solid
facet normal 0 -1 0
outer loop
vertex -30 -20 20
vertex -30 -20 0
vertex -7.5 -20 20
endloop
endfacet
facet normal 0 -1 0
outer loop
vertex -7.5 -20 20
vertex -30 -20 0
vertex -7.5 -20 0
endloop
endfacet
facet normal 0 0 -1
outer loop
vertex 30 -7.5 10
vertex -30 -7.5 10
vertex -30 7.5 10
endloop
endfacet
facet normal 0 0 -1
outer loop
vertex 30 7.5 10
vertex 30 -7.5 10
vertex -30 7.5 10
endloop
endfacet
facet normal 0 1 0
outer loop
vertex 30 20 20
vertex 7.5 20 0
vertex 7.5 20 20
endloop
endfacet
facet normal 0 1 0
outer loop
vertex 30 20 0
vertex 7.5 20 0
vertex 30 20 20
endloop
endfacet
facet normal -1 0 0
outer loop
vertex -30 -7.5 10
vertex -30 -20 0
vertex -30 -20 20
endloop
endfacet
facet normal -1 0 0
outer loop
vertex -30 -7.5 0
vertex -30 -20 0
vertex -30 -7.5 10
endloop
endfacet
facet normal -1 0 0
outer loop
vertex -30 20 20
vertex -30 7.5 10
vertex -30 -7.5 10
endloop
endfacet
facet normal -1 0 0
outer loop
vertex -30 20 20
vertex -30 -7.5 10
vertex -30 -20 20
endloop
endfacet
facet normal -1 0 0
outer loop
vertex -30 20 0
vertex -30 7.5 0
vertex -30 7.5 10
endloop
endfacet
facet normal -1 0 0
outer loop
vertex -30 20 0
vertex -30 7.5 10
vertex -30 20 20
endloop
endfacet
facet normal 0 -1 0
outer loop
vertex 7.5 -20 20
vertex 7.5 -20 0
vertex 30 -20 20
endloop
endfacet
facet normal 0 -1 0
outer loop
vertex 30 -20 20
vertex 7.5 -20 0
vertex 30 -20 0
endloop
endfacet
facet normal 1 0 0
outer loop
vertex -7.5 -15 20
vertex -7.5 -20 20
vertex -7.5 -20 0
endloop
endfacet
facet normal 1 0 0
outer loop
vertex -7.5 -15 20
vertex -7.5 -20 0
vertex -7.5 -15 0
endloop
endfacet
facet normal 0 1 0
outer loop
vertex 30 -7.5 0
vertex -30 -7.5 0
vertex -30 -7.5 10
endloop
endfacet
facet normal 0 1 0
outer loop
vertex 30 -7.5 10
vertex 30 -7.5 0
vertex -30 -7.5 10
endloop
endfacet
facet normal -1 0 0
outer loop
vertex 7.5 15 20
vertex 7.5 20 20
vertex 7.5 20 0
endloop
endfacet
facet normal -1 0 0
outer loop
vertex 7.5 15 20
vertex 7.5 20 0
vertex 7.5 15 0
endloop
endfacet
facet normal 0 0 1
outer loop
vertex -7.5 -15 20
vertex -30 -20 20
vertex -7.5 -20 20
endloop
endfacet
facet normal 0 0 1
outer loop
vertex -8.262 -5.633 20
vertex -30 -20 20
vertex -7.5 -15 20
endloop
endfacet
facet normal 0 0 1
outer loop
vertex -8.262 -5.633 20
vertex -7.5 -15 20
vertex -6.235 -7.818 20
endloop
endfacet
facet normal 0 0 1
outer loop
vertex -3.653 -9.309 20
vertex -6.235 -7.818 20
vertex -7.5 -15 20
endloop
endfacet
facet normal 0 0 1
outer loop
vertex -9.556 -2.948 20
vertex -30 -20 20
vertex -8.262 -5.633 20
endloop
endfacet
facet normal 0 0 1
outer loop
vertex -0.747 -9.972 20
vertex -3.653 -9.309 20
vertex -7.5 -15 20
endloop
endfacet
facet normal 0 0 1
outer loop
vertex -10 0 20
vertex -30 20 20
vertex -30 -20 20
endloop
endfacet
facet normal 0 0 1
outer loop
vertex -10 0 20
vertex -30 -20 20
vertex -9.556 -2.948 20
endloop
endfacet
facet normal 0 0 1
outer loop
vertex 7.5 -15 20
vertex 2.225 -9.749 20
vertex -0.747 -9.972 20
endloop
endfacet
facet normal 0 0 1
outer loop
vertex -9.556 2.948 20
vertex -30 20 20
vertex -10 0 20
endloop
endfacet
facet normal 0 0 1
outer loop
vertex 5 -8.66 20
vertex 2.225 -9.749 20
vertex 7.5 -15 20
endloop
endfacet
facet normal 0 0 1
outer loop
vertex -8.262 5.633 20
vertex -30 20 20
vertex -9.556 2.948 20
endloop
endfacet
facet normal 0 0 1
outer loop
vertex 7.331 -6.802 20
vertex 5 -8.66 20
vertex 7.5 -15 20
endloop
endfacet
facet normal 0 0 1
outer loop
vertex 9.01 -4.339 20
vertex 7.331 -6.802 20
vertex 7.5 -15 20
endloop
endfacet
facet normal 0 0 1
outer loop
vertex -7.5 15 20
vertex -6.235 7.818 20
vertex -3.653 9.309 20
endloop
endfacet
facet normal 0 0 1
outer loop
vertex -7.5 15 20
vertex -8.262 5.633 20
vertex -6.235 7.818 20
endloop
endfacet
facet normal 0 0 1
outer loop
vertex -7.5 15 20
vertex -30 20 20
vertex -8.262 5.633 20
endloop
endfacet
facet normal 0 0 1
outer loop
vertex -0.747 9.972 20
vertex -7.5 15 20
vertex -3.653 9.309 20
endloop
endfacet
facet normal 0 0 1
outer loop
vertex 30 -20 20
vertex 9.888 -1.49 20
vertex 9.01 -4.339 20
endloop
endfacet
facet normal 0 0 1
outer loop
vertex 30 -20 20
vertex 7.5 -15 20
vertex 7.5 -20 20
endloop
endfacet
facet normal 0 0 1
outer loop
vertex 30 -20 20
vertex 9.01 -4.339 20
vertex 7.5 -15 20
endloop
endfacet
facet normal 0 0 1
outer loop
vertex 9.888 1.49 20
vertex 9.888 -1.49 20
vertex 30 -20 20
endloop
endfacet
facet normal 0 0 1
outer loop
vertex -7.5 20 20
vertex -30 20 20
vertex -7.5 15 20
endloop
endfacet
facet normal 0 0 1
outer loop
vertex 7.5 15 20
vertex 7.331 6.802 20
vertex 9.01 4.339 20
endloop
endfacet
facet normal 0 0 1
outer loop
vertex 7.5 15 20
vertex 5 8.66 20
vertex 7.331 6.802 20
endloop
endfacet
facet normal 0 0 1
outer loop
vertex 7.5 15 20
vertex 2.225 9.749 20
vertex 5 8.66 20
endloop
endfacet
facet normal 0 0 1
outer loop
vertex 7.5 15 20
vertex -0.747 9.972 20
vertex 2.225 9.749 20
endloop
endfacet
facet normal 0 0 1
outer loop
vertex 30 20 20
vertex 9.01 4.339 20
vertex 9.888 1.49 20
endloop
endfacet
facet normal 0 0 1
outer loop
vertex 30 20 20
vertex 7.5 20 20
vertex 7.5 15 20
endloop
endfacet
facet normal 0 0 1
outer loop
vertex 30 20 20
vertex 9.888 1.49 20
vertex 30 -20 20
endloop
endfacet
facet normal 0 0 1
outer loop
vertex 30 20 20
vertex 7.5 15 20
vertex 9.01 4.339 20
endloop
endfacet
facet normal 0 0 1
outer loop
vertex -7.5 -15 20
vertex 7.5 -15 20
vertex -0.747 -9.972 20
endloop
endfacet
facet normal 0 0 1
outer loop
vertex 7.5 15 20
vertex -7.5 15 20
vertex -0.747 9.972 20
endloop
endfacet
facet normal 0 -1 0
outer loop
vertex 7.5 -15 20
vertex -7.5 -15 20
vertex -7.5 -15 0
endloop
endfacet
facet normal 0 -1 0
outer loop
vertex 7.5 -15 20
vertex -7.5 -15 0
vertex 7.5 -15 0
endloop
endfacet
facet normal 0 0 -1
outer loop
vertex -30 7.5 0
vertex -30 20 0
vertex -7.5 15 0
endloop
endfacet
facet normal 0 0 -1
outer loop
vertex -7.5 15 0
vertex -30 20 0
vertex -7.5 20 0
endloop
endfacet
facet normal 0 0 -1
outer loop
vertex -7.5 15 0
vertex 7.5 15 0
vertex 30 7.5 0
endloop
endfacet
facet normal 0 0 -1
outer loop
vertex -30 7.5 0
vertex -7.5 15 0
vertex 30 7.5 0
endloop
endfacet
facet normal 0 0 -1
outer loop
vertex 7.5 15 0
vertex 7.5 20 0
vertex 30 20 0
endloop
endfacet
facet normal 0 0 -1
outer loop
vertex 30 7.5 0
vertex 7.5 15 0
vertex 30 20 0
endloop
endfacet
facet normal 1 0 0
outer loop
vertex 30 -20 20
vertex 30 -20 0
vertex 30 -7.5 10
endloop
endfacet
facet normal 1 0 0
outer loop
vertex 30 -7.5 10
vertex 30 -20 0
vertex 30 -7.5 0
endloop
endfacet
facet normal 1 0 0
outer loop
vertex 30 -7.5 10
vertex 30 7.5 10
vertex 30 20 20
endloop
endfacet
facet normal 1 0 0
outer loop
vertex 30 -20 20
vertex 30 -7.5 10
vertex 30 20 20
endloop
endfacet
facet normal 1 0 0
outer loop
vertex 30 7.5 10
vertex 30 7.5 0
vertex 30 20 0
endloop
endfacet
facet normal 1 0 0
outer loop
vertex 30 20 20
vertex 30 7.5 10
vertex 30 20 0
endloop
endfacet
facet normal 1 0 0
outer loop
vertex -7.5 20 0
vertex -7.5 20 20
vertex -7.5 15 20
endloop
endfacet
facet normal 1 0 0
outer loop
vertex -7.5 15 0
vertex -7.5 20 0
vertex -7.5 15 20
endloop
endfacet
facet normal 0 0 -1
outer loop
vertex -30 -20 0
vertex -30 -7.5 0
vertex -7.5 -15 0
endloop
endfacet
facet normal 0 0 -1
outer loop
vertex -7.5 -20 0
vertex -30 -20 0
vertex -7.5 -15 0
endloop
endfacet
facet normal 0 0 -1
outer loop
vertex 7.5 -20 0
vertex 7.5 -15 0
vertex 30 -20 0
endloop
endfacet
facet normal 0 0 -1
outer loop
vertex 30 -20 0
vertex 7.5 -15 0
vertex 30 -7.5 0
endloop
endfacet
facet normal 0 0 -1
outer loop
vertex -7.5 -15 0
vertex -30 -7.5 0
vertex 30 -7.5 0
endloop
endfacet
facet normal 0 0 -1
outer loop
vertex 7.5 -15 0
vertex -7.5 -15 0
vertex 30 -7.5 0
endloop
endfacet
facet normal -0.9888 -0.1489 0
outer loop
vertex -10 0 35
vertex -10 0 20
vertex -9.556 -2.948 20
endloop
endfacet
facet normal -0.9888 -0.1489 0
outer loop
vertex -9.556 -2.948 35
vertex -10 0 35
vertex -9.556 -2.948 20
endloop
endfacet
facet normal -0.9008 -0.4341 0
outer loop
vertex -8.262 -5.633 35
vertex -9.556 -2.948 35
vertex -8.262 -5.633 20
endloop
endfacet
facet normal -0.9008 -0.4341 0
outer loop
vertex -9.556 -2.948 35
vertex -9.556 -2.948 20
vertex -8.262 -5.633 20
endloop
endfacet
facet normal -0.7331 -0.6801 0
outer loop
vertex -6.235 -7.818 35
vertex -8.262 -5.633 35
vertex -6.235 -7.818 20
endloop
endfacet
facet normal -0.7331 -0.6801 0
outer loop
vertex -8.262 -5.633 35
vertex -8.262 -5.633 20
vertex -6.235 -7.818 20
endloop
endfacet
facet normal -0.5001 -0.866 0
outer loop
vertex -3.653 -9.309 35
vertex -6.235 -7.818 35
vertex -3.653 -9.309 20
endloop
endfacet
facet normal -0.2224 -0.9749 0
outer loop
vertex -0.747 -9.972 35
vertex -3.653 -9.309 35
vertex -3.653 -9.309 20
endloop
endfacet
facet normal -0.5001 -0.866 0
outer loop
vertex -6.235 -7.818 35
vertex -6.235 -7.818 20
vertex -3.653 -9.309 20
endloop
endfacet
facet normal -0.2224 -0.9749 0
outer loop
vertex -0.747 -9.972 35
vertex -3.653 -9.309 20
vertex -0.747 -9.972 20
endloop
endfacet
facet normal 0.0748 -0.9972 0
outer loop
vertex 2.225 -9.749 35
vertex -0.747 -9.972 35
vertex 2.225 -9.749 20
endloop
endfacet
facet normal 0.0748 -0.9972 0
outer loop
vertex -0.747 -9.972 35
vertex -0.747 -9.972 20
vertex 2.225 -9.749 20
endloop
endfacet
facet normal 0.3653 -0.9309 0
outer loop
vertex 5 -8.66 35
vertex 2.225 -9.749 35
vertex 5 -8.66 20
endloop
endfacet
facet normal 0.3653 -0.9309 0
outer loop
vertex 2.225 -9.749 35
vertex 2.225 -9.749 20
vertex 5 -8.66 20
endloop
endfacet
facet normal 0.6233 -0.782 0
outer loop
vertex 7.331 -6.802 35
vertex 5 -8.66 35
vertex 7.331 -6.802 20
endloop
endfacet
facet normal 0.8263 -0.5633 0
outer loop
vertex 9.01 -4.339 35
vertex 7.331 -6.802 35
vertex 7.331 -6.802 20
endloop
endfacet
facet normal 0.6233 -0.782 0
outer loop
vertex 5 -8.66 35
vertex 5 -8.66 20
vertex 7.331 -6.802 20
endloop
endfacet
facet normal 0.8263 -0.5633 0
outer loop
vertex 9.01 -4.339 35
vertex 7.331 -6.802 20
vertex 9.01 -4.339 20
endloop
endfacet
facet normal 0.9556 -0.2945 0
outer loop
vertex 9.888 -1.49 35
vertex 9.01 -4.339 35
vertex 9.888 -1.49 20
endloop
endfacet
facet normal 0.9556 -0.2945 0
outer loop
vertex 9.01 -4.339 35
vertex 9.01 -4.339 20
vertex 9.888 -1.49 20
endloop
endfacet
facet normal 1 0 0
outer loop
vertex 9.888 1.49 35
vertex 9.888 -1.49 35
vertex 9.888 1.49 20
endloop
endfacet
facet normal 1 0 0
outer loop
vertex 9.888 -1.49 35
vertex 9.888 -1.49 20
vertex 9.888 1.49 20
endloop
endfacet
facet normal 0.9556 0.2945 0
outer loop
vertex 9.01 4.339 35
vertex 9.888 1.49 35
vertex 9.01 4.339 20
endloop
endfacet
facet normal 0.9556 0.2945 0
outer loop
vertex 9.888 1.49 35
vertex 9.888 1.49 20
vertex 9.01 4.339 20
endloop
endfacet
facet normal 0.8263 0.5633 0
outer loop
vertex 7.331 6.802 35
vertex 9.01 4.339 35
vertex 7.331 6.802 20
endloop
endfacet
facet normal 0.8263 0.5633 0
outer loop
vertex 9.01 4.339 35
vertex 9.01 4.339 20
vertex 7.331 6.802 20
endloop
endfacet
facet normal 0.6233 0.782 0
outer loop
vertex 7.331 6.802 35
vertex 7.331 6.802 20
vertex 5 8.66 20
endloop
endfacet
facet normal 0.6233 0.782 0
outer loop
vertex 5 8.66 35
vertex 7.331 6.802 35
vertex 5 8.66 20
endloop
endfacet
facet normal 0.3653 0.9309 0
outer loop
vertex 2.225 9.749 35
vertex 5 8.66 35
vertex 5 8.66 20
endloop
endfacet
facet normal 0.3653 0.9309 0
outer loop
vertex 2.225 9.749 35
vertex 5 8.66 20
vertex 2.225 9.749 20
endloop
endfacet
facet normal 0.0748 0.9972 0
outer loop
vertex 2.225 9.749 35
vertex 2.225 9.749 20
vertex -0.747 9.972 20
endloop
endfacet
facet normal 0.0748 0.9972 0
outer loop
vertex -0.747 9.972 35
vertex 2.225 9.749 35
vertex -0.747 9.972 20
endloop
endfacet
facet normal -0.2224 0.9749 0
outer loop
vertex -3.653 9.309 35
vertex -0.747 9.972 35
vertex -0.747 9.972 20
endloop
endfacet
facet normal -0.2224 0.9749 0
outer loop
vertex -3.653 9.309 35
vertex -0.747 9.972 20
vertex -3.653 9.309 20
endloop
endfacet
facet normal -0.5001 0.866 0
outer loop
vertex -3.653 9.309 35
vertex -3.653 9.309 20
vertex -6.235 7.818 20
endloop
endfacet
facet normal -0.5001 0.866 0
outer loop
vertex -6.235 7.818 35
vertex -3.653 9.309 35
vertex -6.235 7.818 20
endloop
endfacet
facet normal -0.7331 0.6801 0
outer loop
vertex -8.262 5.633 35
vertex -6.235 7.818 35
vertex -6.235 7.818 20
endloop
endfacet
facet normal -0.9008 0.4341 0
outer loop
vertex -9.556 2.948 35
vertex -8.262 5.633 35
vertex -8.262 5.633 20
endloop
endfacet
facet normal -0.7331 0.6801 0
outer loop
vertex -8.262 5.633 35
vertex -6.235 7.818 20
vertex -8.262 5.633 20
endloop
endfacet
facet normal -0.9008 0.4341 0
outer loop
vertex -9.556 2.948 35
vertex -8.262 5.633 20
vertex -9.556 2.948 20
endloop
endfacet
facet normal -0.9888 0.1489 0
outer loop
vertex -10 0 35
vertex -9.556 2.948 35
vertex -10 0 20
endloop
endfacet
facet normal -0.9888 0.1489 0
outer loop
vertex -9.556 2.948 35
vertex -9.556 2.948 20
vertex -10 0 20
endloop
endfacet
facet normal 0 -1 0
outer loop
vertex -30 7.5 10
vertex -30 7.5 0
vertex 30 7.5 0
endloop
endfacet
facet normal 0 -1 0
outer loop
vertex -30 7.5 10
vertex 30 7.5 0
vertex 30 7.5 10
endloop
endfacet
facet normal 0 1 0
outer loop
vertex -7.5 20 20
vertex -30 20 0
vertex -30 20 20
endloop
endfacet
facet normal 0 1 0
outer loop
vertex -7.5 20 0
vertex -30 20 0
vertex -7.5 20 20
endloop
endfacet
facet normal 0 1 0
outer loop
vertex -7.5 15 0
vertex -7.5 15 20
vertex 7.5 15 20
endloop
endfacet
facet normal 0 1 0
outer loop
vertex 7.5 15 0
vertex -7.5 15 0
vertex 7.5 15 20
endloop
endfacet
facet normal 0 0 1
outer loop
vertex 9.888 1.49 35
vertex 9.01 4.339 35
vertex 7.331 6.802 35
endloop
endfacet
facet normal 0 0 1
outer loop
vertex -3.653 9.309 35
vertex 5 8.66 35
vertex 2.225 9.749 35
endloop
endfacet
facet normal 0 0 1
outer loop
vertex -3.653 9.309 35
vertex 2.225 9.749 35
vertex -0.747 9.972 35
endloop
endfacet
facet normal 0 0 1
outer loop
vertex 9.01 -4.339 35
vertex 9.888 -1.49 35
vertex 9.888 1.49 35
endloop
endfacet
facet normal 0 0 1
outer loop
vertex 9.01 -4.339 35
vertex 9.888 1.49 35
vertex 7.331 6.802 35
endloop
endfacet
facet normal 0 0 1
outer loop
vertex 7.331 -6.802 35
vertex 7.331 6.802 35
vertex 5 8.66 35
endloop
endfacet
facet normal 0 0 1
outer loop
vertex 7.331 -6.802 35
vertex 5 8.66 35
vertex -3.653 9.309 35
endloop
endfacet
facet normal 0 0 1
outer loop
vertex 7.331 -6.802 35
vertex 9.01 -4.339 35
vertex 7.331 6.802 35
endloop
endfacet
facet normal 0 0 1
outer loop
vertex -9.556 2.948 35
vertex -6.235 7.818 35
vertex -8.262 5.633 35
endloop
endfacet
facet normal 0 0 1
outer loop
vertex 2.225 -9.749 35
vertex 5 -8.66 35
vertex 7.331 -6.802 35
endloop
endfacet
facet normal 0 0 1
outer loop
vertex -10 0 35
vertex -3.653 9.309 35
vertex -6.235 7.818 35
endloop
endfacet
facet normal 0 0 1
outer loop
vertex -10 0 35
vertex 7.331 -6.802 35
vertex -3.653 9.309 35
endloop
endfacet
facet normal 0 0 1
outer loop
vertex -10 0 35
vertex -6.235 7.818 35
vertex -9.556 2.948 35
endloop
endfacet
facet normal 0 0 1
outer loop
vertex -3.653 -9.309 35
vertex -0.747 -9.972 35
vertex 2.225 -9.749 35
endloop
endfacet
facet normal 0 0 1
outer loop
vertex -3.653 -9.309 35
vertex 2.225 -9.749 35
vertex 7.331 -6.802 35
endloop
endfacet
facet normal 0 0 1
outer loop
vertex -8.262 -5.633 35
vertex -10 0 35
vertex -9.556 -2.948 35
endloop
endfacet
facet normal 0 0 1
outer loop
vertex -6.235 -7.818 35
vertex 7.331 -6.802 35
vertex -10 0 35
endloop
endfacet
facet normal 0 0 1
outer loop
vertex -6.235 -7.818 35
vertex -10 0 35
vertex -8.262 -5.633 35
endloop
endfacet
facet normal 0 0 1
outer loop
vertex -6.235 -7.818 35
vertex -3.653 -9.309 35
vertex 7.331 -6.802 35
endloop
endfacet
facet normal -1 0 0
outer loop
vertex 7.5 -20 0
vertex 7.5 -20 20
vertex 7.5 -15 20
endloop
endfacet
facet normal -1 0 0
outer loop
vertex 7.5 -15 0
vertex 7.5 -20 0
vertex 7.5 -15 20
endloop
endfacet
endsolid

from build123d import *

# Parameters (mm, degrees)
SKETCH_1_W          = 60
SKETCH_1_H          = 40
EXTRUDE_1_DEPTH     = 20
SKETCH_2_R          = 10
EXTRUDE_2_DEPTH     = 15
SKETCH_3_W          = 15
SKETCH_3_H          = 5
CUT_EXTRUDE_1_DEPTH = 42.231056256
SKETCH_4_W          = 10
SKETCH_4_H          = 15
CUT_EXTRUDE_2_DEPTH = 73.284161474


with BuildPart() as part:
    # Эскиз1 → Бобышка-Вытянуть1 (new body)
    with BuildSketch(Plane.XY):
        Rectangle(SKETCH_1_W, SKETCH_1_H)
    extrude(amount=EXTRUDE_1_DEPTH)

    # Эскиз2 → Бобышка-Вытянуть2 (add)
    with BuildSketch(Plane.XY.offset(20)):
        with Locations(Location((0, 0, 0), (0, 0, 180))):
            Circle(SKETCH_2_R)
    extrude(amount=EXTRUDE_2_DEPTH)

    # Эскиз3 → Вырез-Вытянуть1 (cut, through all)
    with BuildSketch(Plane.XY.offset(20)):
        with Locations((0, -17.5)):
            Rectangle(SKETCH_3_W, SKETCH_3_H)
    cut_extrude_1 = extrude(amount=-CUT_EXTRUDE_1_DEPTH, mode=Mode.SUBTRACT)

    # Зеркальное отражение1: Вырез-Вытянуть1 across plane
    add(cut_extrude_1.mirror(Plane.ZX), mode=Mode.SUBTRACT)

    # Эскиз4 → Вырез-Вытянуть2 (cut, through all)
    with BuildSketch(Plane.ZY.offset(30)):
        with Locations((5, 0)):
            Rectangle(SKETCH_4_W, SKETCH_4_H)
    extrude(amount=-CUT_EXTRUDE_2_DEPTH, mode=Mode.SUBTRACT)


solid = part.part
